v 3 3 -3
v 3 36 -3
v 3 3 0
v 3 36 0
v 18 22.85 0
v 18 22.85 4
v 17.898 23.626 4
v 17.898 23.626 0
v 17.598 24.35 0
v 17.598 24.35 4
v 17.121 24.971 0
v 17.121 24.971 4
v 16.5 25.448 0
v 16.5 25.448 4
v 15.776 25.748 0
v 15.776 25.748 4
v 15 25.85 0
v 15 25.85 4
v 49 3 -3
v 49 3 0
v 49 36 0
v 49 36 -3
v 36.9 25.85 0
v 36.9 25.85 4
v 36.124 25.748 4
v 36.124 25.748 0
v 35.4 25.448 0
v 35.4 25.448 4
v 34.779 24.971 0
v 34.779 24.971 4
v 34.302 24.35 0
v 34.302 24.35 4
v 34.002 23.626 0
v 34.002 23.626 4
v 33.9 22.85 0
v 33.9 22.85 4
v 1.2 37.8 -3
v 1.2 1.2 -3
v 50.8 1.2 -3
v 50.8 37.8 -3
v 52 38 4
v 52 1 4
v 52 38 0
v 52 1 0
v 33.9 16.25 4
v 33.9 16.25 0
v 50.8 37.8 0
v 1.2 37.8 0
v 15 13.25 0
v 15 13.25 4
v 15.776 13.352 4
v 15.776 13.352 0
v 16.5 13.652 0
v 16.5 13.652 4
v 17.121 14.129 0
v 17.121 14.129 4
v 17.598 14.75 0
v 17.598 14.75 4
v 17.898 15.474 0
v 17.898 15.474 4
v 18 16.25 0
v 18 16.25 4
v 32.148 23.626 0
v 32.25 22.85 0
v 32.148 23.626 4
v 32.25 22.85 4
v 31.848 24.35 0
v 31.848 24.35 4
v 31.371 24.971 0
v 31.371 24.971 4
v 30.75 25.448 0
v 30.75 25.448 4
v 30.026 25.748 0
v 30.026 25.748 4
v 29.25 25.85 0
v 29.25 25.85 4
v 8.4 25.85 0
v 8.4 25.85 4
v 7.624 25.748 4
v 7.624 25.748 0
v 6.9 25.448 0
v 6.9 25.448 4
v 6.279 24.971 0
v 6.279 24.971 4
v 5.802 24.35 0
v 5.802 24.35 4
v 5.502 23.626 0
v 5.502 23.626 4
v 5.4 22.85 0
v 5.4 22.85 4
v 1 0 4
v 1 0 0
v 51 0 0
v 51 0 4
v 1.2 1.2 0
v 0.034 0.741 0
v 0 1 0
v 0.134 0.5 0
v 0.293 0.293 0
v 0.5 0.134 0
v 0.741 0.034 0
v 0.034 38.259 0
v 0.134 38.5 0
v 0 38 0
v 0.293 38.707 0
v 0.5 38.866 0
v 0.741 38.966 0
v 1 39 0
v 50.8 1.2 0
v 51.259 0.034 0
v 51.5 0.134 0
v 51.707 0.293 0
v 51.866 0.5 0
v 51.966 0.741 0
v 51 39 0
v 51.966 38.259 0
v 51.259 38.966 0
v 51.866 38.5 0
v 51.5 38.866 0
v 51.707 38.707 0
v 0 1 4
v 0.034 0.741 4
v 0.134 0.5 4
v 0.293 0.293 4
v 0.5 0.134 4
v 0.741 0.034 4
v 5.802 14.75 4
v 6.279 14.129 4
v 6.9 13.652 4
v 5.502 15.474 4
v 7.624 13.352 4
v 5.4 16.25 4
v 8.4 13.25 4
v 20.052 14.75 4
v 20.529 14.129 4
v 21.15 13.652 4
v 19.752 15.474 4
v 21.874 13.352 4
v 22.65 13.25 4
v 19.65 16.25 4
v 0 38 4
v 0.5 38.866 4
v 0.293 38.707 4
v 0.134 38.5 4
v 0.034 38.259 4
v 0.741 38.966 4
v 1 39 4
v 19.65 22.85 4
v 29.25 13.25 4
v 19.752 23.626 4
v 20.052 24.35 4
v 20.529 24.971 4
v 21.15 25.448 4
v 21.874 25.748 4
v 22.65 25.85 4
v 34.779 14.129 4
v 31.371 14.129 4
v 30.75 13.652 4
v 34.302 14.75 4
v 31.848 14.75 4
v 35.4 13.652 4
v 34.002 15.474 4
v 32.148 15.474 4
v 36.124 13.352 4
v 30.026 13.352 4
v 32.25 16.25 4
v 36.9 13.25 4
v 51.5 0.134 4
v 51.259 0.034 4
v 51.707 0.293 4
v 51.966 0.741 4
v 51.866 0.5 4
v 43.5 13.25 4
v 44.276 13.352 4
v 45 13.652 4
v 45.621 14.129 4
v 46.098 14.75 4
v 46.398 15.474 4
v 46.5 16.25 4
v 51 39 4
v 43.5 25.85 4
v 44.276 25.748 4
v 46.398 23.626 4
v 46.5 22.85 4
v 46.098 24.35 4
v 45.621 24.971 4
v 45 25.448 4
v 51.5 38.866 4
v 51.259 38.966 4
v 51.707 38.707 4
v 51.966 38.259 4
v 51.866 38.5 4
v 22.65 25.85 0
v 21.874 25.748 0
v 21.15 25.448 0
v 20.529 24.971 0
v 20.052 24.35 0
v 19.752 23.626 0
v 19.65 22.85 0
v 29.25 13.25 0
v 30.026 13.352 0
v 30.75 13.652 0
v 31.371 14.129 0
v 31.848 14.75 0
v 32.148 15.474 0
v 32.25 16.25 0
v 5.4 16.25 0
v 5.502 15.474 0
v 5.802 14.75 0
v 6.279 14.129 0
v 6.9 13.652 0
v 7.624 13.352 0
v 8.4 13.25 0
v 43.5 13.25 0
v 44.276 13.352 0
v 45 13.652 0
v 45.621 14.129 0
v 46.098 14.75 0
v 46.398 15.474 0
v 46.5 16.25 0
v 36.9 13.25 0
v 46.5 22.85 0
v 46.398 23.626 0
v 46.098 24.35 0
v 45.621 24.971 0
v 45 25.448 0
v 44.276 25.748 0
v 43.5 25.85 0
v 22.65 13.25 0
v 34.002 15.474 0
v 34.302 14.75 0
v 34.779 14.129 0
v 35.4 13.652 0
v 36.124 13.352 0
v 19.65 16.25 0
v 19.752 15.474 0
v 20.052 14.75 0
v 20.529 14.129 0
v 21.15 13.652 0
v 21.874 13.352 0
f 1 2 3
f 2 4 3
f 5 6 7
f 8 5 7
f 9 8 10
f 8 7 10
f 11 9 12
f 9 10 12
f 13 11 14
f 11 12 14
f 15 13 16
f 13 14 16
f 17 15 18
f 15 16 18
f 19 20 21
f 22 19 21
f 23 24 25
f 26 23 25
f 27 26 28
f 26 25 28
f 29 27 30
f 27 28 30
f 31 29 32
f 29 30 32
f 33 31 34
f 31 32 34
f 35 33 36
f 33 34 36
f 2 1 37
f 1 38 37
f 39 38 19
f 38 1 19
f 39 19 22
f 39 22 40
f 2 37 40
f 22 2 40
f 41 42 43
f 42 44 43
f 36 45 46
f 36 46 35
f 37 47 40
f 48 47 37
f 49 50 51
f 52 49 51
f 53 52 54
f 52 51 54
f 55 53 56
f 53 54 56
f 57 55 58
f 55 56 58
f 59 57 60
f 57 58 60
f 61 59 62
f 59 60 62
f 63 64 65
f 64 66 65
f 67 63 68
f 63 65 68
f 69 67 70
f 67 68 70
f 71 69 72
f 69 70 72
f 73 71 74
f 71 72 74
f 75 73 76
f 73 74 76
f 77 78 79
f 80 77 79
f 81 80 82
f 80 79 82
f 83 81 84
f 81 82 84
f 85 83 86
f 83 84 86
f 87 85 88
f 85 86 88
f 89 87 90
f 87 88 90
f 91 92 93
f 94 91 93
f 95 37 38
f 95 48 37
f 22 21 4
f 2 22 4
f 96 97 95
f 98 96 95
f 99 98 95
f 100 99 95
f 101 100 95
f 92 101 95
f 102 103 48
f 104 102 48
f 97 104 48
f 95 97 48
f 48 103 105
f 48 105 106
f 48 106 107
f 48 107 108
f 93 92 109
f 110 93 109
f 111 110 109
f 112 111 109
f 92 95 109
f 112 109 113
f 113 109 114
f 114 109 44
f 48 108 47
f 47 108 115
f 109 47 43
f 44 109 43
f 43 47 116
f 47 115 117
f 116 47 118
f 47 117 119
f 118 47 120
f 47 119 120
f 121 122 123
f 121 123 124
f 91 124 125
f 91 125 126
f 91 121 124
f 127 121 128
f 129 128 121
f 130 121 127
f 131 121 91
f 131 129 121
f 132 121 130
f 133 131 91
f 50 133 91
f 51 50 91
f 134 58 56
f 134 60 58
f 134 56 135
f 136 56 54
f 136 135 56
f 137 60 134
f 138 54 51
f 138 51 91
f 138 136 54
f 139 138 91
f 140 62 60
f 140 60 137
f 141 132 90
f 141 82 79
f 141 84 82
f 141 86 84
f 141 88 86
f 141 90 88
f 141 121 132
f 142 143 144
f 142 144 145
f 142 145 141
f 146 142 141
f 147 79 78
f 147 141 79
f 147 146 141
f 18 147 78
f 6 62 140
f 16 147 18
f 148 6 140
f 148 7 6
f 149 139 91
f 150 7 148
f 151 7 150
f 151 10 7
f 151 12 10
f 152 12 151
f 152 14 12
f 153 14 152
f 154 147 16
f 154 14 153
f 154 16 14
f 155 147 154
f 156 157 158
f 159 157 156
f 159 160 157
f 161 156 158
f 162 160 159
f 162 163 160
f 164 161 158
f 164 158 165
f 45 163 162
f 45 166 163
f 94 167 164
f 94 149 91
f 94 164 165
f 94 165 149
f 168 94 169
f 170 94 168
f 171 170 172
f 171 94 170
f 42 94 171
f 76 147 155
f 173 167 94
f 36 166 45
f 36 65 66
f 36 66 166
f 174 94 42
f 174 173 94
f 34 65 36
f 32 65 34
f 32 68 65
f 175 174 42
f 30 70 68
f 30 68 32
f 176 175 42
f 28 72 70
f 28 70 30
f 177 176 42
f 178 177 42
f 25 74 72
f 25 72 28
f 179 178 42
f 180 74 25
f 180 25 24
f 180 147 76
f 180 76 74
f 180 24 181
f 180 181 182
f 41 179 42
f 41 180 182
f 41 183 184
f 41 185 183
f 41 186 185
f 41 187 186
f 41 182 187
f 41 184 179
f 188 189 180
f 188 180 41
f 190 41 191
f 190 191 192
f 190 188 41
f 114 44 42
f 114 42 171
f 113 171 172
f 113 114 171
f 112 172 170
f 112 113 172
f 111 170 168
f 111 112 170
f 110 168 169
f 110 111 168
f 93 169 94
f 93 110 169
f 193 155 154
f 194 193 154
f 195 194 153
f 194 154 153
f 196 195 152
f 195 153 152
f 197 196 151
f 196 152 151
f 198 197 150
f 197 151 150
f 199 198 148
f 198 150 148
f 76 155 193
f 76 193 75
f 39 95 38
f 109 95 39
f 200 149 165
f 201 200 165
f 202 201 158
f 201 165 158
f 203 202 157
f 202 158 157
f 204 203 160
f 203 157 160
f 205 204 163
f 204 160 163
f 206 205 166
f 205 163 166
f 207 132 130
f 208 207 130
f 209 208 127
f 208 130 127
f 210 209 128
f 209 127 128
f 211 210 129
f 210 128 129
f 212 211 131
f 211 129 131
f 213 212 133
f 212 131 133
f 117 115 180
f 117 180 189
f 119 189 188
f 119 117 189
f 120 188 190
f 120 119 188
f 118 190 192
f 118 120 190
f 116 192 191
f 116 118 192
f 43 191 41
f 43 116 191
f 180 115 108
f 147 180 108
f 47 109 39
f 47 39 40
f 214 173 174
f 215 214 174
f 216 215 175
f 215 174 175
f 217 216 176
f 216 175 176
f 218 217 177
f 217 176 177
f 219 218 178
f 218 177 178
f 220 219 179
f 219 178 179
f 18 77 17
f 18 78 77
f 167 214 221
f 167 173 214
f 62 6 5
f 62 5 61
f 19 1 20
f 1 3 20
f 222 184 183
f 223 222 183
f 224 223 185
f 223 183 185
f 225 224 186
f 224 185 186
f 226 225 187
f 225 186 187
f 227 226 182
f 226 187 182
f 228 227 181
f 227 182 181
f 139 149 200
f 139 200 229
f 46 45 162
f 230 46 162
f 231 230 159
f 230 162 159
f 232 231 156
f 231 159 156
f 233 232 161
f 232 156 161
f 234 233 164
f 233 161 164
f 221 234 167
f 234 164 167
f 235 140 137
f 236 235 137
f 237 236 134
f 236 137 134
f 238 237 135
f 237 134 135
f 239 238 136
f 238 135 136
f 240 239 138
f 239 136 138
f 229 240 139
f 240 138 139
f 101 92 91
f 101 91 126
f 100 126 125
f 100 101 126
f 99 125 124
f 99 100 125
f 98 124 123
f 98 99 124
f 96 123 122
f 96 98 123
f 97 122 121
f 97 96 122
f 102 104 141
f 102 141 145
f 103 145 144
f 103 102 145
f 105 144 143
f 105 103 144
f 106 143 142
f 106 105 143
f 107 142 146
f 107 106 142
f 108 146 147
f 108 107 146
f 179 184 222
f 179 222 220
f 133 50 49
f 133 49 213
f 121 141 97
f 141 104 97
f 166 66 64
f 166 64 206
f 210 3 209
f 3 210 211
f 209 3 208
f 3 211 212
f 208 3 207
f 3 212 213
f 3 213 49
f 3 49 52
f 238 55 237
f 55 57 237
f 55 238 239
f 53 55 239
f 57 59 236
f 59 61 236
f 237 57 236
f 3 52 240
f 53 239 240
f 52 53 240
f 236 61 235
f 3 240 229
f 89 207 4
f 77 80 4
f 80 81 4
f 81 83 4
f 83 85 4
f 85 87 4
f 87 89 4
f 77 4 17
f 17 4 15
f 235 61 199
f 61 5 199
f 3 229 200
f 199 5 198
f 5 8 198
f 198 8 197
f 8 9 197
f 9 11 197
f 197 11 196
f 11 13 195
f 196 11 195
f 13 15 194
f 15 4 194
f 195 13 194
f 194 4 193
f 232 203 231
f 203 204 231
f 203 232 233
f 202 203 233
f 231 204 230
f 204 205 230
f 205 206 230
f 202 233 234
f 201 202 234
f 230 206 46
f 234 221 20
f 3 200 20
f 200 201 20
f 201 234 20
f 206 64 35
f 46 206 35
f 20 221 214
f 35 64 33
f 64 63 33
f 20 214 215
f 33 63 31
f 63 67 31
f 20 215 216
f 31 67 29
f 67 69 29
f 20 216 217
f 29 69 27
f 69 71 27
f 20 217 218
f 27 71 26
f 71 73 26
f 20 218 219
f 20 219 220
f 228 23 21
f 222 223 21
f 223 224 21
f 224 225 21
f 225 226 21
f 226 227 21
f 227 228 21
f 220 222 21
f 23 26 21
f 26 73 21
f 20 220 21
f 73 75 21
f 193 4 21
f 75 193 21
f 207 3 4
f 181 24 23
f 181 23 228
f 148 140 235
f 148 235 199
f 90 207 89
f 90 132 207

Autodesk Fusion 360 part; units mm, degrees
sketch "Sketch1" plane through (0, 0, 0) normal (0, 0, 1) x (1, 0, 0)
  line L0 (1, 0) -> (51, 0)
  line L1 (52, 1) -> (52, 38)
  line L2 (51, 39) -> (1, 39)
  line L3 (0, 38) -> (0, 1)
  arc A0 (1, 39) -> (0, 38) centre (1, 38) ccw
  arc A1 (52, 38) -> (51, 39) centre (51, 38) ccw
  arc A2 (51, 0) -> (52, 1) centre (51, 1) ccw
  arc A3 (0, 1) -> (1, 0) centre (1, 1) ccw
  line L4 (1.2, 37.8) -> (1.2, 1.2)
  line L5 (1.2, 1.2) -> (50.8, 1.2)
  line L6 (50.8, 1.2) -> (50.8, 37.8)
  line L7 (50.8, 37.8) -> (1.2, 37.8)
  line L8 (49, 3) -> (49, 36)
  line L9 (49, 36) -> (3, 36)
  line L10 (3, 36) -> (3, 3)
  line L11 (3, 3) -> (49, 3)
  point P0 (52, 0)
  point P1 (0, 39)
  dimension "d1" = 52
  dimension "d2" = 39
  dimension "d3" = 1
  dimension "d6" = -1.2
  dimension "d7" = -3
extrude "Extrude1" add sketch "Sketch1" along normal blind 4 contours L0 L1 L2 L3 A0 A1 A2 A3 | L4 L5 L6 L7 | L8 L9 L10 L11
sketch "Sketch2" plane through (0, 0, 4) normal (0, 0, 1) x (-1, 0, 0)
  arc A0 (0, -1) -> (-1, 0) centre (-1, -1) ccw
  line L0 (-1, 0) -> (-51, 0)
  arc A1 (-51, 0) -> (-52, -1) centre (-51, -1) ccw
  line L1 (-52, -1) -> (-52, -38)
  arc A2 (-52, -38) -> (-51, -39) centre (-51, -38) ccw
  line L2 (-51, -39) -> (-1, -39)
  arc A3 (-1, -39) -> (0, -38) centre (-1, -38) ccw
  line L3 (0, -38) -> (0, -1)
sketch "Sketch3" plane through (0, 0, 4) normal (0, 0, 1) x (-1, 0, 0)
extrude "Extrude2" add sketch "Sketch1" against normal blind 3 contours L4 L5 L6 L7
sketch "Sketch4" plane through (0, 0, 4) normal (0, 0, 1) x (-1, 0, 0)
sketch "Sketch5" plane through (0, 0, 4) normal (0, 0, 1) x (-1, 0, 0)
  line L0 (-43.5, -13.25) -> (-36.9, -13.25)
  line L1 (-33.9, -16.25) -> (-33.9, -22.85)
  line L2 (-36.9, -25.85) -> (-43.5, -25.85)
  line L3 (-46.5, -22.85) -> (-46.5, -16.25)
  arc A0 (-43.5, -13.25) -> (-46.5, -16.25) centre (-43.5, -16.25) ccw
  arc A1 (-33.9, -16.25) -> (-36.9, -13.25) centre (-36.9, -16.25) ccw
  arc A2 (-36.9, -25.85) -> (-33.9, -22.85) centre (-36.9, -22.85) ccw
  arc A3 (-46.5, -22.85) -> (-43.5, -25.85) centre (-43.5, -22.85) ccw
  line L4 (-1, 0) -> (-51, 0)
  line L5 (-49, -3) -> (-49, -36)
  line L6 (-29.25, -13.25) -> (-22.65, -13.25)
  arc A4 (-29.25, -13.25) -> (-32.25, -16.25) centre (-29.25, -16.25) ccw
  line L7 (-32.25, -22.85) -> (-32.25, -16.25)
  arc A5 (-32.25, -22.85) -> (-29.25, -25.85) centre (-29.25, -22.85) ccw
  arc A6 (-22.65, -25.85) -> (-19.65, -22.85) centre (-22.65, -22.85) ccw
  line L8 (-22.65, -25.85) -> (-29.25, -25.85)
  line L9 (-19.65, -16.25) -> (-19.65, -22.85)
  arc A7 (-19.65, -16.25) -> (-22.65, -13.25) centre (-22.65, -16.25) ccw
  line L10 (-15, -13.25) -> (-8.4, -13.25)
  arc A8 (-15, -13.25) -> (-18, -16.25) centre (-15, -16.25) ccw
  line L11 (-18, -22.85) -> (-18, -16.25)
  arc A9 (-18, -22.85) -> (-15, -25.85) centre (-15, -22.85) ccw
  arc A10 (-8.4, -25.85) -> (-5.4, -22.85) centre (-8.4, -22.85) ccw
  line L12 (-8.4, -25.85) -> (-15, -25.85)
  line L13 (-5.4, -16.25) -> (-5.4, -22.85)
  arc A11 (-5.4, -16.25) -> (-8.4, -13.25) centre (-8.4, -16.25) ccw
  point P0 (-46.5, -13.25)
  point P1 (-33.9, -13.25)
  point P2 (-46.5, -25.85)
  dimension "d10" = 12.6
  dimension "d11" = 12.6
  dimension "d12" = 3
  dimension "d13" = 13.25
  dimension "d14" = 2.5
  dimension "d17" = 14.25
  dimension "d18" = 0
extrude "Extrude3" cut sketch "Sketch5" against normal blind 8
